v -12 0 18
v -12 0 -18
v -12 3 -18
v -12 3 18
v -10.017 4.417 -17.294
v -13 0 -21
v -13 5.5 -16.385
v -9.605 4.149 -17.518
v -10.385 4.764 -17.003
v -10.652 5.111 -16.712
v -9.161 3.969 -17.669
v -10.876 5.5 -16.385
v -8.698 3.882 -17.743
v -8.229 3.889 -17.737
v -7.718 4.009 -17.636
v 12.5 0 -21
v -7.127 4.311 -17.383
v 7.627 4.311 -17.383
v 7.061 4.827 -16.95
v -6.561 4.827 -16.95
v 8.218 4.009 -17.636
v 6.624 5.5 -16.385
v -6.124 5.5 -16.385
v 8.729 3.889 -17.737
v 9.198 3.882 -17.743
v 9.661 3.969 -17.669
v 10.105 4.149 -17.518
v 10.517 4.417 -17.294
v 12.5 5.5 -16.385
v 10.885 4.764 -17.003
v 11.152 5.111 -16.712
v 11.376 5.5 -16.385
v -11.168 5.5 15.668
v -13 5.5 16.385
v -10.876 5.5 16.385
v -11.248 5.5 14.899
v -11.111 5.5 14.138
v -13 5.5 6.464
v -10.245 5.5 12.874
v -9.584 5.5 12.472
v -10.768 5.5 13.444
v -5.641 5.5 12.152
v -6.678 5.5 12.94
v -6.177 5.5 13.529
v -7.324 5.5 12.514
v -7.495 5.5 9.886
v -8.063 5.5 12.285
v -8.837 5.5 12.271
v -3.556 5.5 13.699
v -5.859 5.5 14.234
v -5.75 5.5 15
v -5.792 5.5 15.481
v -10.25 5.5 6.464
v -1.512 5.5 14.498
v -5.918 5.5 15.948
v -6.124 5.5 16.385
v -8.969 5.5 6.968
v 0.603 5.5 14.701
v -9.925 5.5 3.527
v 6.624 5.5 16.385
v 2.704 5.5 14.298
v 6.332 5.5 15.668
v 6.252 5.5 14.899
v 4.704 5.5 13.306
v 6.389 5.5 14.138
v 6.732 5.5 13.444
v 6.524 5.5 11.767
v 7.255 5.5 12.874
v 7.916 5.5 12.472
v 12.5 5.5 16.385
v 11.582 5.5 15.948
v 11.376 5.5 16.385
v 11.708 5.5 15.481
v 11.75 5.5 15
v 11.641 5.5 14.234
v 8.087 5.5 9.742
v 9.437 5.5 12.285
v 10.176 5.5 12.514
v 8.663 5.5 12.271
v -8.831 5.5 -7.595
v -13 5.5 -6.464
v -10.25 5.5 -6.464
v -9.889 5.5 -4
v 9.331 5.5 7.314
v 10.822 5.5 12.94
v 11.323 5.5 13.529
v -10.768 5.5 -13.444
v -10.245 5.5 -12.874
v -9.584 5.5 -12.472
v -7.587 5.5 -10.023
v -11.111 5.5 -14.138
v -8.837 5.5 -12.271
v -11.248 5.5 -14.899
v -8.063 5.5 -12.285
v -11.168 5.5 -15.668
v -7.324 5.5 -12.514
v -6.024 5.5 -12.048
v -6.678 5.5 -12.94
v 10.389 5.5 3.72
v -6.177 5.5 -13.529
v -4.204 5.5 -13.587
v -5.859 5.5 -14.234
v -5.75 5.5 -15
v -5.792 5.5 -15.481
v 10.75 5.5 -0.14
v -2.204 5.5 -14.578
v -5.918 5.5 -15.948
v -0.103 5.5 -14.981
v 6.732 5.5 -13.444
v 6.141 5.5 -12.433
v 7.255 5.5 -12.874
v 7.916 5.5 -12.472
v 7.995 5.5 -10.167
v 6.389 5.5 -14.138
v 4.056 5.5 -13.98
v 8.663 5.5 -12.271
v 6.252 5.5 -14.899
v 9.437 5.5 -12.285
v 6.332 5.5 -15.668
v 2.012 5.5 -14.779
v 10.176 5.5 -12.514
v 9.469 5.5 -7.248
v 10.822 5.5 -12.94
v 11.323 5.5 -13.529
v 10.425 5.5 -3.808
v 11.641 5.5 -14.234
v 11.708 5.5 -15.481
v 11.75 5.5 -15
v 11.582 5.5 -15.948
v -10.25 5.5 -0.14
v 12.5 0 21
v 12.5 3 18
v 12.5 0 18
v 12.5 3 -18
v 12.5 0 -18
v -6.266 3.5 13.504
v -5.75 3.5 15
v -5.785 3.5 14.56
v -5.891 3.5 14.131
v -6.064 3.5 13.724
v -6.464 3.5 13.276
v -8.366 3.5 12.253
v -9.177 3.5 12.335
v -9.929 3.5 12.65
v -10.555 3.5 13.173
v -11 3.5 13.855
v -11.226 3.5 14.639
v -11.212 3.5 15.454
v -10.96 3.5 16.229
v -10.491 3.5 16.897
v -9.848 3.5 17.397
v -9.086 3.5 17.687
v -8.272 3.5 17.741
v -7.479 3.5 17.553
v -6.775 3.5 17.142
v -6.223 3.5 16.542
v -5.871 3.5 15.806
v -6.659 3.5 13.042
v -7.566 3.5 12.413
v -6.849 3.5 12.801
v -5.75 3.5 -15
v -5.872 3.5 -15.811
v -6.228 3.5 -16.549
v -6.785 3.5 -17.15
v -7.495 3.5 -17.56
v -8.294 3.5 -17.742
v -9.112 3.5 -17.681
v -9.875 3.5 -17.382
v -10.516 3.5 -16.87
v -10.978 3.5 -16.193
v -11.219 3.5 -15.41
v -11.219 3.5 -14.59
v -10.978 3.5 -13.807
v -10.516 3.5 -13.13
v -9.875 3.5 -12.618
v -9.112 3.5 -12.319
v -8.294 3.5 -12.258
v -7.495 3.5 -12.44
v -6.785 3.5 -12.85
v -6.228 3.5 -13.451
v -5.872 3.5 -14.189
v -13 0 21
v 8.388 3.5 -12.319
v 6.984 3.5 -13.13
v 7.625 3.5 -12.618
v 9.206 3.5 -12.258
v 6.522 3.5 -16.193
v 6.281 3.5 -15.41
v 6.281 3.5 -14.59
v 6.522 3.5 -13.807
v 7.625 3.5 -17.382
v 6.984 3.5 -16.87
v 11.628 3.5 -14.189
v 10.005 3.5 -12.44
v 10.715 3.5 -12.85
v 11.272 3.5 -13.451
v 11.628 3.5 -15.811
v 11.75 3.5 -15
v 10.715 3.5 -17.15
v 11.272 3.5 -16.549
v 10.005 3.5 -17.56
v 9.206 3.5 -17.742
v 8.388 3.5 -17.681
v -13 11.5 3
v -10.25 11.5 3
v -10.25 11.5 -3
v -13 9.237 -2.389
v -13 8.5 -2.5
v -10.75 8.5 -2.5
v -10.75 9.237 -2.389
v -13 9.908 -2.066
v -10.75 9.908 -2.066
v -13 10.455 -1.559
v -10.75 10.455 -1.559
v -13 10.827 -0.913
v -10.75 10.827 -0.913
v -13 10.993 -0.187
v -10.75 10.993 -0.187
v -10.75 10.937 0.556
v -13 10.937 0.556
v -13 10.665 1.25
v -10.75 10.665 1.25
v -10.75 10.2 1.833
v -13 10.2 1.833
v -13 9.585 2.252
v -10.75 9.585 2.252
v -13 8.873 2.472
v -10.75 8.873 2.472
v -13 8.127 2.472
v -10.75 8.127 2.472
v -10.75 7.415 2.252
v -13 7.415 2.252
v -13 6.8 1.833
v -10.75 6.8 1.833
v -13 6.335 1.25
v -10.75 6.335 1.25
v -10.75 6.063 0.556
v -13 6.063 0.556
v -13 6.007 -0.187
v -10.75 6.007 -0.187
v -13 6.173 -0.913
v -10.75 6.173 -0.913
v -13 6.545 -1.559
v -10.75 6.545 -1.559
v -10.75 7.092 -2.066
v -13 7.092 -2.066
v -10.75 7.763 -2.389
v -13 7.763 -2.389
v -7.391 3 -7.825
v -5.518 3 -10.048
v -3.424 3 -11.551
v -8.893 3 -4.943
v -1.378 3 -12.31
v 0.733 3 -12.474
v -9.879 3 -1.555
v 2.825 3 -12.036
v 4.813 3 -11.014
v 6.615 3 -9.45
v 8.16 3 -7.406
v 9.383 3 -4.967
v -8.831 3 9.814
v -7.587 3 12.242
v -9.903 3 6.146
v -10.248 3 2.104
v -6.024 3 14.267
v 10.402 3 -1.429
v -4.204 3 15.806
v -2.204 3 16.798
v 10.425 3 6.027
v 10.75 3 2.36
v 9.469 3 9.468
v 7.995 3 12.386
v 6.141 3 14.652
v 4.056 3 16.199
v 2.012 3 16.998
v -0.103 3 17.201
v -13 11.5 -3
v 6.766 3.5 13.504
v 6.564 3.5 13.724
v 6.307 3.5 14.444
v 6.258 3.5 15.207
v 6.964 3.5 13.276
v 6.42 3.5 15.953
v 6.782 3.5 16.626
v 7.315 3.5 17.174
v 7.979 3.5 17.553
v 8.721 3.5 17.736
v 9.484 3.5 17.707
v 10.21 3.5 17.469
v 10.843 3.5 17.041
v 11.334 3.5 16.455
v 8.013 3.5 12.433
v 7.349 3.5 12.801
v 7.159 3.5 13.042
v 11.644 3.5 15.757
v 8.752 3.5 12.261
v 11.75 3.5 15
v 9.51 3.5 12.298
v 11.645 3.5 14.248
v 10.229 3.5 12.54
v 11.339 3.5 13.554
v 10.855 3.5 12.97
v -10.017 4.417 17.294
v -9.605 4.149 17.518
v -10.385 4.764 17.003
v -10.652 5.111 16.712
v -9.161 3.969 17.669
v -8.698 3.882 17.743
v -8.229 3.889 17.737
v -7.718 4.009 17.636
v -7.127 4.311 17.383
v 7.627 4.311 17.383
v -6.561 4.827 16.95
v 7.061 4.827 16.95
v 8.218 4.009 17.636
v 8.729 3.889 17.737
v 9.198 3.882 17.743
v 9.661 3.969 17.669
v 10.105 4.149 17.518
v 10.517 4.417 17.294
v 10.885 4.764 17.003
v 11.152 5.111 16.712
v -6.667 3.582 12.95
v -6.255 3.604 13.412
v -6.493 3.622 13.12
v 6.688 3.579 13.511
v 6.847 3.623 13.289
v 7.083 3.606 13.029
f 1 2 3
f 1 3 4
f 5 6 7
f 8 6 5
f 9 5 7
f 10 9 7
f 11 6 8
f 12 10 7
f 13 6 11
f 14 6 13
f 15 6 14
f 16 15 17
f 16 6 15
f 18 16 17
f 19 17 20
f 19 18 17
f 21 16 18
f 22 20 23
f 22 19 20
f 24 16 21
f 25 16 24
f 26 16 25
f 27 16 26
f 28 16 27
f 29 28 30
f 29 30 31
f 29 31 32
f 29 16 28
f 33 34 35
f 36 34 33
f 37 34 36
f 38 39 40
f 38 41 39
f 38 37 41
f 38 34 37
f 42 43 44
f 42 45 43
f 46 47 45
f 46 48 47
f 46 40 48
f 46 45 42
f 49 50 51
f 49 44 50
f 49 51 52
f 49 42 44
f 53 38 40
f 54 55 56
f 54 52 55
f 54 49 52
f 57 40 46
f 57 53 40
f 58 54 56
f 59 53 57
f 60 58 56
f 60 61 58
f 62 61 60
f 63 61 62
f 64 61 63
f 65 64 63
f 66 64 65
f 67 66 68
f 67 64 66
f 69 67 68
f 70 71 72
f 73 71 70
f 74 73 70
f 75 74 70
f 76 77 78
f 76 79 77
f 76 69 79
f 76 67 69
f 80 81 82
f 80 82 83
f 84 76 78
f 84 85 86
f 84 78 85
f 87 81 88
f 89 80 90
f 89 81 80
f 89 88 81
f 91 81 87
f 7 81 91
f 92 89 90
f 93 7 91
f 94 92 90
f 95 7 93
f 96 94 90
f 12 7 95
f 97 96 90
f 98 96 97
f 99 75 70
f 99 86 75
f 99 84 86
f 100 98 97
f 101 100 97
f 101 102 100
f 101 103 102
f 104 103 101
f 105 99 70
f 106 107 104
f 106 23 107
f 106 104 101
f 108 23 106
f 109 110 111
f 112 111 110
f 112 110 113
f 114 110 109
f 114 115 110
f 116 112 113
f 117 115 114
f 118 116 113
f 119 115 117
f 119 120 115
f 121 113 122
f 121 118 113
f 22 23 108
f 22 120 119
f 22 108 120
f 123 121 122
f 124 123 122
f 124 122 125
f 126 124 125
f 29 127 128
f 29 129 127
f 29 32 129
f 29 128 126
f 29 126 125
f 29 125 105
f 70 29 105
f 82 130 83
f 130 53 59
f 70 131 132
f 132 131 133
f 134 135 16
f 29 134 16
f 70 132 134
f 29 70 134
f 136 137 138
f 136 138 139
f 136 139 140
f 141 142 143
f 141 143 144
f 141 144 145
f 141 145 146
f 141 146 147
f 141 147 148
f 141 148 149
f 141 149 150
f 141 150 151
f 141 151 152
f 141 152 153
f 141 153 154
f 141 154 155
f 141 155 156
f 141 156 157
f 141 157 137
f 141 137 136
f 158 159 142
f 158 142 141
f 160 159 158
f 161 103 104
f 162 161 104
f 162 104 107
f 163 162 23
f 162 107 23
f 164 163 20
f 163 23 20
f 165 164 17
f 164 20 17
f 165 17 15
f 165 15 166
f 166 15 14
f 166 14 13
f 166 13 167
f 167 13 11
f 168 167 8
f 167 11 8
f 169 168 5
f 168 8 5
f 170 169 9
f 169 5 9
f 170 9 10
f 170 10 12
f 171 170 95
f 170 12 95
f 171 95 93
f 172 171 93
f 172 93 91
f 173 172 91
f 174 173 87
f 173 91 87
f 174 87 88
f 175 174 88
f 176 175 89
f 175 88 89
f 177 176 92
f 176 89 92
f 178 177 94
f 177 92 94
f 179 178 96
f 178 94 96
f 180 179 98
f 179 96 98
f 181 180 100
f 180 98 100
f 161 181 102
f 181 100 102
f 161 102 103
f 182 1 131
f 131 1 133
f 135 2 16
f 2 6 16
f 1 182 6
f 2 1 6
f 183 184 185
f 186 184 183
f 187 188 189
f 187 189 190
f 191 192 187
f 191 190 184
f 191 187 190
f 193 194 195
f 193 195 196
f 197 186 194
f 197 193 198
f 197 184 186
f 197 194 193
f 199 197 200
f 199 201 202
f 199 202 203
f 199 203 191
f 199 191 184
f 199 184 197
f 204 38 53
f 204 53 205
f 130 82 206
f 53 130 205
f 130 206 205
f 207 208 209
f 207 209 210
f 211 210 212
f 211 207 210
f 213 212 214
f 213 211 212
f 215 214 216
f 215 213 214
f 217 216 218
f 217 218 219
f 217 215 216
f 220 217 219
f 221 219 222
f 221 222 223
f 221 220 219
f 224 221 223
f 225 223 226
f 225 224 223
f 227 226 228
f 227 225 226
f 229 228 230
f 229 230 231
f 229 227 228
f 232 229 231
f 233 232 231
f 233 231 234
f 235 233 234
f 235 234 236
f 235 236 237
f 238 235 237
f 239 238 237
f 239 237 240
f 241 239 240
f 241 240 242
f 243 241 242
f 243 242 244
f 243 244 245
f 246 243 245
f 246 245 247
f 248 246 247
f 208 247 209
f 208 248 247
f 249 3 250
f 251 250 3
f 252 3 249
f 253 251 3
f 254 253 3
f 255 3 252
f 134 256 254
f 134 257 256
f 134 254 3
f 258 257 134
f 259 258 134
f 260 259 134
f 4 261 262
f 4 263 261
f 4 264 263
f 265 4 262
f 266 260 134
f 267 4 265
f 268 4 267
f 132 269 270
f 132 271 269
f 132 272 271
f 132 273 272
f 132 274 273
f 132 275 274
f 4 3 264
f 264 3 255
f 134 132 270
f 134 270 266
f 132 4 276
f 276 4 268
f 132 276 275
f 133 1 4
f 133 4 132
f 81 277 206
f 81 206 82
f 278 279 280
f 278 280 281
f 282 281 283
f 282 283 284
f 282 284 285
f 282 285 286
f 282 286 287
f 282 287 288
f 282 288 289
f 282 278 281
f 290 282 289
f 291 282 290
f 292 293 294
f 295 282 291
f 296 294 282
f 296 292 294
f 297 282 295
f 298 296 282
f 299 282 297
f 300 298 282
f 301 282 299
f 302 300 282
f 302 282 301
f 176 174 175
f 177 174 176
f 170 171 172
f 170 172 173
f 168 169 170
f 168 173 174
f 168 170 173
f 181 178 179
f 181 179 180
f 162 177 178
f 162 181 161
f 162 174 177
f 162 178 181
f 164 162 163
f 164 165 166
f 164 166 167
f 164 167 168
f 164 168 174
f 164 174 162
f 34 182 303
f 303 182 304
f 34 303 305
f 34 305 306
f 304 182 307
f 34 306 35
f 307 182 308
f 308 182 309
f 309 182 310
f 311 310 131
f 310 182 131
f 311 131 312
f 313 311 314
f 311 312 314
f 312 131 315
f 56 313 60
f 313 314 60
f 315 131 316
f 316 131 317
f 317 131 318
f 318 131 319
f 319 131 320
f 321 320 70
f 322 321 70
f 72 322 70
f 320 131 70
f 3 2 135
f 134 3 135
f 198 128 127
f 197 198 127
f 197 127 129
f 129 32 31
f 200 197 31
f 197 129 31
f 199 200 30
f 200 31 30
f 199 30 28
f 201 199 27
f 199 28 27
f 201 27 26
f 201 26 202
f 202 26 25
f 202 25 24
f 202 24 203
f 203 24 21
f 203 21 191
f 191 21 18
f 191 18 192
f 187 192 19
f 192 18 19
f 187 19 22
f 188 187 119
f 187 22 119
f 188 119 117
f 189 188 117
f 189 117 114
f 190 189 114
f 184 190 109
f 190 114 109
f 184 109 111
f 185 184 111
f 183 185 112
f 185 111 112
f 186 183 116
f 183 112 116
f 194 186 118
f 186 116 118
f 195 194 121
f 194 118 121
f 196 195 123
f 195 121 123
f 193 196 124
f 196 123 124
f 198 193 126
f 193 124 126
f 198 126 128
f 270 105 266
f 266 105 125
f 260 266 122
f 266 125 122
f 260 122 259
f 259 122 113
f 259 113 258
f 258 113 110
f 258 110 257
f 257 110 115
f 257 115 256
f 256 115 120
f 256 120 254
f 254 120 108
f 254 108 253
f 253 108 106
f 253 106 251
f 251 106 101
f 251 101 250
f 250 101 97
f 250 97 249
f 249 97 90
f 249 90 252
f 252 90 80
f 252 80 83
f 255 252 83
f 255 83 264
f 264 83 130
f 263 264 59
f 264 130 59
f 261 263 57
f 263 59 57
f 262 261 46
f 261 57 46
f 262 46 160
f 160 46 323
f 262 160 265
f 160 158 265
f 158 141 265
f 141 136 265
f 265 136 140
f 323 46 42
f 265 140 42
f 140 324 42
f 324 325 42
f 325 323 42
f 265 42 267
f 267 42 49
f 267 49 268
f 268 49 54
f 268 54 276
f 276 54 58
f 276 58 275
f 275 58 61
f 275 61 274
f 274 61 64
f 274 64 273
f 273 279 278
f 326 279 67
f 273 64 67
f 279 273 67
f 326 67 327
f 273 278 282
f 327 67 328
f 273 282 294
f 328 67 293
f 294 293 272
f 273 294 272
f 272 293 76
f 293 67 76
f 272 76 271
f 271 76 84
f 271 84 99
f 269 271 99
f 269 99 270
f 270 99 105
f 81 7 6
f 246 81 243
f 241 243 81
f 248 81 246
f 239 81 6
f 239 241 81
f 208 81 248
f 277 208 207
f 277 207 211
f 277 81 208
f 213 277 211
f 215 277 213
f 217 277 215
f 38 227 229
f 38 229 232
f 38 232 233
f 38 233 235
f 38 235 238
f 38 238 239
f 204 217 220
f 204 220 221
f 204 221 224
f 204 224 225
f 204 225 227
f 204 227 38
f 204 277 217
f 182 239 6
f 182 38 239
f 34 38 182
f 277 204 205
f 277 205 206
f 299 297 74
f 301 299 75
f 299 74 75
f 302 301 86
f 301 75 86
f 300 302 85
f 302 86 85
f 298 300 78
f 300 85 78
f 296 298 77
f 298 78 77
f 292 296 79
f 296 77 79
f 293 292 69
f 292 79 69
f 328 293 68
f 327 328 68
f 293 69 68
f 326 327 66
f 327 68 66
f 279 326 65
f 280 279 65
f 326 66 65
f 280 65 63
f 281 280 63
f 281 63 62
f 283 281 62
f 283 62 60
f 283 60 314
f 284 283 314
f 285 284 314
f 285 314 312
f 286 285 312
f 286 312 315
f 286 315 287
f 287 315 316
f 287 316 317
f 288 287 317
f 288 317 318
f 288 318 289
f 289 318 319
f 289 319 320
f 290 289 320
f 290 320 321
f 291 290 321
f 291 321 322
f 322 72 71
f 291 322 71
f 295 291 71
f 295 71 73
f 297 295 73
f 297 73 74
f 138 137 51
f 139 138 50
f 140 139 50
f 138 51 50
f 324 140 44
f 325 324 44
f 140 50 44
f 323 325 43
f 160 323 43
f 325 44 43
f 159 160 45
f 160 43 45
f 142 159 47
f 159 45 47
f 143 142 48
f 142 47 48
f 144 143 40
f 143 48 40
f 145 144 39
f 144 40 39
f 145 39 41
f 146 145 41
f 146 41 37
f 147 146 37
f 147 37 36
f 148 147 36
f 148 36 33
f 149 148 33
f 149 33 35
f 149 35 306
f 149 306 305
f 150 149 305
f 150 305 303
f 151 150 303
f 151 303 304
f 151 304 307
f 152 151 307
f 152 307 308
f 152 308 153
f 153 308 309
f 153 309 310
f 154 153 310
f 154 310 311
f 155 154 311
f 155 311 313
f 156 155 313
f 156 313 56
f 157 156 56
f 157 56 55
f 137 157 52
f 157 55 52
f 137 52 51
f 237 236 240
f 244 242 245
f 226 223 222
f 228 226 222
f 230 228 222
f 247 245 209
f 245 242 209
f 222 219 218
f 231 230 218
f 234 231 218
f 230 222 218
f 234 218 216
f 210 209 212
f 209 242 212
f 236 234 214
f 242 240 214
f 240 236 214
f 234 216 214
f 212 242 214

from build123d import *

# Parameters (mm, degrees)
SKETCH1_W                = 25.5
SKETCH1_H                = 42
BOSS_EXTRUDE1_DEPTH      = 5.5
SKETCH2_W                = 25
SKETCH2_H                = 36
CUT_EXTRUDE1_DEPTH       = 3
SKETCH3_R                = 10.5
CUT_EXTRUDE6_DEPTH       = 29
SKETCH6_R                = 2.75
CUT_EXTRUDE7_DEPTH       = 2
CUT_EXTRUDE8_DEPTH       = 13.5
CUT_EXTRUDE8_DEPTH_BACK  = 14
BOSS_EXTRUDE2_DEPTH      = 2.75
SKETCH9_R                = 2.5
CUT_EXTRUDE11_DEPTH      = 2.25
CUT_EXTRUDE12_DEPTH      = 13.5
CUT_EXTRUDE12_DEPTH_BACK = 14


with BuildPart() as part:
    # Sketch1 → Boss-Extrude1 (new body)
    with BuildSketch(Plane(origin=(0, 0, 0), x_dir=(1, 0, 0), z_dir=(0, 1, 0))):
        with Locations((-0.25, 0)):
            Rectangle(SKETCH1_W, SKETCH1_H)
    extrude(amount=BOSS_EXTRUDE1_DEPTH)

    # Sketch2 → Cut-Extrude1 (cut)
    with BuildSketch(Plane.XZ):
        with Locations((0.5, 0)):
            Rectangle(SKETCH2_W, SKETCH2_H)
    extrude(amount=-CUT_EXTRUDE1_DEPTH, mode=Mode.SUBTRACT)

    # Sketch3 → Cut-Extrude6 (cut)
    with BuildSketch(Plane(origin=(0, 13.25, -13.25), x_dir=(1, 0, 0), z_dir=(0, 0.707106781, -0.707106781))):
        with Locations((0.25, -3.789844892)):
            Circle(SKETCH3_R)
    extrude(amount=-CUT_EXTRUDE6_DEPTH, mode=Mode.SUBTRACT)

    # Sketch6 → Cut-Extrude7 (cut)
    with BuildSketch(Plane(origin=(0, 5.5, 0), x_dir=(1, 0, 0), z_dir=(0, 1, 0))):
        with Locations((-8.5, 15)):
            Circle(SKETCH6_R)
        with Locations((9, 15)):
            Circle(SKETCH6_R)
        with Locations((-8.5, -15)):
            Circle(SKETCH6_R)
        with Locations((9, -15)):
            Circle(SKETCH6_R)
    extrude(amount=-CUT_EXTRUDE7_DEPTH, mode=Mode.SUBTRACT)

    # Sketch7 → Cut-Extrude8 (cut, two sides)
    with BuildSketch(Plane(origin=(0, 0, 0), x_dir=(0, 0, -1), z_dir=(1, 0, 0))) as cut_extrude8_sk:
        Polygon((-21, 0), (-12.82380275, 9.744012446), (-21, 9.744012446), align=None)
    extrude(amount=CUT_EXTRUDE8_DEPTH, mode=Mode.SUBTRACT)
    extrude(cut_extrude8_sk.sketch, amount=-CUT_EXTRUDE8_DEPTH_BACK, mode=Mode.SUBTRACT)

    # Sketch8 → Boss-Extrude2 (add)
    with BuildSketch(Plane(origin=(-13, 0, 0), x_dir=(0, 0, -1), z_dir=(1, 0, 0))):
        Polygon((-3, 11.5), (3, 11.5), (6.464101615, 5.5), (-6.464101615, 5.5), align=None)
    extrude(amount=BOSS_EXTRUDE2_DEPTH)

    # Sketch9 → Cut-Extrude11 (cut)
    with BuildSketch(Plane(origin=(-13, 0, 0), x_dir=(0, 0, -1), z_dir=(1, 0, 0))):
        with Locations((0, 8.5)):
            Circle(SKETCH9_R)
    extrude(amount=CUT_EXTRUDE11_DEPTH, mode=Mode.SUBTRACT)

    # Sketch10 → Cut-Extrude12 (cut, two sides)
    with BuildSketch(Plane(origin=(0, 0, 0), x_dir=(0, 0, -1), z_dir=(1, 0, 0))) as cut_extrude12_sk:
        Polygon((21, 0), (15.965402213, 6), (21, 6), align=None)
    extrude(amount=CUT_EXTRUDE12_DEPTH, mode=Mode.SUBTRACT)
    extrude(cut_extrude12_sk.sketch, amount=-CUT_EXTRUDE12_DEPTH_BACK, mode=Mode.SUBTRACT)


solid = part.part
